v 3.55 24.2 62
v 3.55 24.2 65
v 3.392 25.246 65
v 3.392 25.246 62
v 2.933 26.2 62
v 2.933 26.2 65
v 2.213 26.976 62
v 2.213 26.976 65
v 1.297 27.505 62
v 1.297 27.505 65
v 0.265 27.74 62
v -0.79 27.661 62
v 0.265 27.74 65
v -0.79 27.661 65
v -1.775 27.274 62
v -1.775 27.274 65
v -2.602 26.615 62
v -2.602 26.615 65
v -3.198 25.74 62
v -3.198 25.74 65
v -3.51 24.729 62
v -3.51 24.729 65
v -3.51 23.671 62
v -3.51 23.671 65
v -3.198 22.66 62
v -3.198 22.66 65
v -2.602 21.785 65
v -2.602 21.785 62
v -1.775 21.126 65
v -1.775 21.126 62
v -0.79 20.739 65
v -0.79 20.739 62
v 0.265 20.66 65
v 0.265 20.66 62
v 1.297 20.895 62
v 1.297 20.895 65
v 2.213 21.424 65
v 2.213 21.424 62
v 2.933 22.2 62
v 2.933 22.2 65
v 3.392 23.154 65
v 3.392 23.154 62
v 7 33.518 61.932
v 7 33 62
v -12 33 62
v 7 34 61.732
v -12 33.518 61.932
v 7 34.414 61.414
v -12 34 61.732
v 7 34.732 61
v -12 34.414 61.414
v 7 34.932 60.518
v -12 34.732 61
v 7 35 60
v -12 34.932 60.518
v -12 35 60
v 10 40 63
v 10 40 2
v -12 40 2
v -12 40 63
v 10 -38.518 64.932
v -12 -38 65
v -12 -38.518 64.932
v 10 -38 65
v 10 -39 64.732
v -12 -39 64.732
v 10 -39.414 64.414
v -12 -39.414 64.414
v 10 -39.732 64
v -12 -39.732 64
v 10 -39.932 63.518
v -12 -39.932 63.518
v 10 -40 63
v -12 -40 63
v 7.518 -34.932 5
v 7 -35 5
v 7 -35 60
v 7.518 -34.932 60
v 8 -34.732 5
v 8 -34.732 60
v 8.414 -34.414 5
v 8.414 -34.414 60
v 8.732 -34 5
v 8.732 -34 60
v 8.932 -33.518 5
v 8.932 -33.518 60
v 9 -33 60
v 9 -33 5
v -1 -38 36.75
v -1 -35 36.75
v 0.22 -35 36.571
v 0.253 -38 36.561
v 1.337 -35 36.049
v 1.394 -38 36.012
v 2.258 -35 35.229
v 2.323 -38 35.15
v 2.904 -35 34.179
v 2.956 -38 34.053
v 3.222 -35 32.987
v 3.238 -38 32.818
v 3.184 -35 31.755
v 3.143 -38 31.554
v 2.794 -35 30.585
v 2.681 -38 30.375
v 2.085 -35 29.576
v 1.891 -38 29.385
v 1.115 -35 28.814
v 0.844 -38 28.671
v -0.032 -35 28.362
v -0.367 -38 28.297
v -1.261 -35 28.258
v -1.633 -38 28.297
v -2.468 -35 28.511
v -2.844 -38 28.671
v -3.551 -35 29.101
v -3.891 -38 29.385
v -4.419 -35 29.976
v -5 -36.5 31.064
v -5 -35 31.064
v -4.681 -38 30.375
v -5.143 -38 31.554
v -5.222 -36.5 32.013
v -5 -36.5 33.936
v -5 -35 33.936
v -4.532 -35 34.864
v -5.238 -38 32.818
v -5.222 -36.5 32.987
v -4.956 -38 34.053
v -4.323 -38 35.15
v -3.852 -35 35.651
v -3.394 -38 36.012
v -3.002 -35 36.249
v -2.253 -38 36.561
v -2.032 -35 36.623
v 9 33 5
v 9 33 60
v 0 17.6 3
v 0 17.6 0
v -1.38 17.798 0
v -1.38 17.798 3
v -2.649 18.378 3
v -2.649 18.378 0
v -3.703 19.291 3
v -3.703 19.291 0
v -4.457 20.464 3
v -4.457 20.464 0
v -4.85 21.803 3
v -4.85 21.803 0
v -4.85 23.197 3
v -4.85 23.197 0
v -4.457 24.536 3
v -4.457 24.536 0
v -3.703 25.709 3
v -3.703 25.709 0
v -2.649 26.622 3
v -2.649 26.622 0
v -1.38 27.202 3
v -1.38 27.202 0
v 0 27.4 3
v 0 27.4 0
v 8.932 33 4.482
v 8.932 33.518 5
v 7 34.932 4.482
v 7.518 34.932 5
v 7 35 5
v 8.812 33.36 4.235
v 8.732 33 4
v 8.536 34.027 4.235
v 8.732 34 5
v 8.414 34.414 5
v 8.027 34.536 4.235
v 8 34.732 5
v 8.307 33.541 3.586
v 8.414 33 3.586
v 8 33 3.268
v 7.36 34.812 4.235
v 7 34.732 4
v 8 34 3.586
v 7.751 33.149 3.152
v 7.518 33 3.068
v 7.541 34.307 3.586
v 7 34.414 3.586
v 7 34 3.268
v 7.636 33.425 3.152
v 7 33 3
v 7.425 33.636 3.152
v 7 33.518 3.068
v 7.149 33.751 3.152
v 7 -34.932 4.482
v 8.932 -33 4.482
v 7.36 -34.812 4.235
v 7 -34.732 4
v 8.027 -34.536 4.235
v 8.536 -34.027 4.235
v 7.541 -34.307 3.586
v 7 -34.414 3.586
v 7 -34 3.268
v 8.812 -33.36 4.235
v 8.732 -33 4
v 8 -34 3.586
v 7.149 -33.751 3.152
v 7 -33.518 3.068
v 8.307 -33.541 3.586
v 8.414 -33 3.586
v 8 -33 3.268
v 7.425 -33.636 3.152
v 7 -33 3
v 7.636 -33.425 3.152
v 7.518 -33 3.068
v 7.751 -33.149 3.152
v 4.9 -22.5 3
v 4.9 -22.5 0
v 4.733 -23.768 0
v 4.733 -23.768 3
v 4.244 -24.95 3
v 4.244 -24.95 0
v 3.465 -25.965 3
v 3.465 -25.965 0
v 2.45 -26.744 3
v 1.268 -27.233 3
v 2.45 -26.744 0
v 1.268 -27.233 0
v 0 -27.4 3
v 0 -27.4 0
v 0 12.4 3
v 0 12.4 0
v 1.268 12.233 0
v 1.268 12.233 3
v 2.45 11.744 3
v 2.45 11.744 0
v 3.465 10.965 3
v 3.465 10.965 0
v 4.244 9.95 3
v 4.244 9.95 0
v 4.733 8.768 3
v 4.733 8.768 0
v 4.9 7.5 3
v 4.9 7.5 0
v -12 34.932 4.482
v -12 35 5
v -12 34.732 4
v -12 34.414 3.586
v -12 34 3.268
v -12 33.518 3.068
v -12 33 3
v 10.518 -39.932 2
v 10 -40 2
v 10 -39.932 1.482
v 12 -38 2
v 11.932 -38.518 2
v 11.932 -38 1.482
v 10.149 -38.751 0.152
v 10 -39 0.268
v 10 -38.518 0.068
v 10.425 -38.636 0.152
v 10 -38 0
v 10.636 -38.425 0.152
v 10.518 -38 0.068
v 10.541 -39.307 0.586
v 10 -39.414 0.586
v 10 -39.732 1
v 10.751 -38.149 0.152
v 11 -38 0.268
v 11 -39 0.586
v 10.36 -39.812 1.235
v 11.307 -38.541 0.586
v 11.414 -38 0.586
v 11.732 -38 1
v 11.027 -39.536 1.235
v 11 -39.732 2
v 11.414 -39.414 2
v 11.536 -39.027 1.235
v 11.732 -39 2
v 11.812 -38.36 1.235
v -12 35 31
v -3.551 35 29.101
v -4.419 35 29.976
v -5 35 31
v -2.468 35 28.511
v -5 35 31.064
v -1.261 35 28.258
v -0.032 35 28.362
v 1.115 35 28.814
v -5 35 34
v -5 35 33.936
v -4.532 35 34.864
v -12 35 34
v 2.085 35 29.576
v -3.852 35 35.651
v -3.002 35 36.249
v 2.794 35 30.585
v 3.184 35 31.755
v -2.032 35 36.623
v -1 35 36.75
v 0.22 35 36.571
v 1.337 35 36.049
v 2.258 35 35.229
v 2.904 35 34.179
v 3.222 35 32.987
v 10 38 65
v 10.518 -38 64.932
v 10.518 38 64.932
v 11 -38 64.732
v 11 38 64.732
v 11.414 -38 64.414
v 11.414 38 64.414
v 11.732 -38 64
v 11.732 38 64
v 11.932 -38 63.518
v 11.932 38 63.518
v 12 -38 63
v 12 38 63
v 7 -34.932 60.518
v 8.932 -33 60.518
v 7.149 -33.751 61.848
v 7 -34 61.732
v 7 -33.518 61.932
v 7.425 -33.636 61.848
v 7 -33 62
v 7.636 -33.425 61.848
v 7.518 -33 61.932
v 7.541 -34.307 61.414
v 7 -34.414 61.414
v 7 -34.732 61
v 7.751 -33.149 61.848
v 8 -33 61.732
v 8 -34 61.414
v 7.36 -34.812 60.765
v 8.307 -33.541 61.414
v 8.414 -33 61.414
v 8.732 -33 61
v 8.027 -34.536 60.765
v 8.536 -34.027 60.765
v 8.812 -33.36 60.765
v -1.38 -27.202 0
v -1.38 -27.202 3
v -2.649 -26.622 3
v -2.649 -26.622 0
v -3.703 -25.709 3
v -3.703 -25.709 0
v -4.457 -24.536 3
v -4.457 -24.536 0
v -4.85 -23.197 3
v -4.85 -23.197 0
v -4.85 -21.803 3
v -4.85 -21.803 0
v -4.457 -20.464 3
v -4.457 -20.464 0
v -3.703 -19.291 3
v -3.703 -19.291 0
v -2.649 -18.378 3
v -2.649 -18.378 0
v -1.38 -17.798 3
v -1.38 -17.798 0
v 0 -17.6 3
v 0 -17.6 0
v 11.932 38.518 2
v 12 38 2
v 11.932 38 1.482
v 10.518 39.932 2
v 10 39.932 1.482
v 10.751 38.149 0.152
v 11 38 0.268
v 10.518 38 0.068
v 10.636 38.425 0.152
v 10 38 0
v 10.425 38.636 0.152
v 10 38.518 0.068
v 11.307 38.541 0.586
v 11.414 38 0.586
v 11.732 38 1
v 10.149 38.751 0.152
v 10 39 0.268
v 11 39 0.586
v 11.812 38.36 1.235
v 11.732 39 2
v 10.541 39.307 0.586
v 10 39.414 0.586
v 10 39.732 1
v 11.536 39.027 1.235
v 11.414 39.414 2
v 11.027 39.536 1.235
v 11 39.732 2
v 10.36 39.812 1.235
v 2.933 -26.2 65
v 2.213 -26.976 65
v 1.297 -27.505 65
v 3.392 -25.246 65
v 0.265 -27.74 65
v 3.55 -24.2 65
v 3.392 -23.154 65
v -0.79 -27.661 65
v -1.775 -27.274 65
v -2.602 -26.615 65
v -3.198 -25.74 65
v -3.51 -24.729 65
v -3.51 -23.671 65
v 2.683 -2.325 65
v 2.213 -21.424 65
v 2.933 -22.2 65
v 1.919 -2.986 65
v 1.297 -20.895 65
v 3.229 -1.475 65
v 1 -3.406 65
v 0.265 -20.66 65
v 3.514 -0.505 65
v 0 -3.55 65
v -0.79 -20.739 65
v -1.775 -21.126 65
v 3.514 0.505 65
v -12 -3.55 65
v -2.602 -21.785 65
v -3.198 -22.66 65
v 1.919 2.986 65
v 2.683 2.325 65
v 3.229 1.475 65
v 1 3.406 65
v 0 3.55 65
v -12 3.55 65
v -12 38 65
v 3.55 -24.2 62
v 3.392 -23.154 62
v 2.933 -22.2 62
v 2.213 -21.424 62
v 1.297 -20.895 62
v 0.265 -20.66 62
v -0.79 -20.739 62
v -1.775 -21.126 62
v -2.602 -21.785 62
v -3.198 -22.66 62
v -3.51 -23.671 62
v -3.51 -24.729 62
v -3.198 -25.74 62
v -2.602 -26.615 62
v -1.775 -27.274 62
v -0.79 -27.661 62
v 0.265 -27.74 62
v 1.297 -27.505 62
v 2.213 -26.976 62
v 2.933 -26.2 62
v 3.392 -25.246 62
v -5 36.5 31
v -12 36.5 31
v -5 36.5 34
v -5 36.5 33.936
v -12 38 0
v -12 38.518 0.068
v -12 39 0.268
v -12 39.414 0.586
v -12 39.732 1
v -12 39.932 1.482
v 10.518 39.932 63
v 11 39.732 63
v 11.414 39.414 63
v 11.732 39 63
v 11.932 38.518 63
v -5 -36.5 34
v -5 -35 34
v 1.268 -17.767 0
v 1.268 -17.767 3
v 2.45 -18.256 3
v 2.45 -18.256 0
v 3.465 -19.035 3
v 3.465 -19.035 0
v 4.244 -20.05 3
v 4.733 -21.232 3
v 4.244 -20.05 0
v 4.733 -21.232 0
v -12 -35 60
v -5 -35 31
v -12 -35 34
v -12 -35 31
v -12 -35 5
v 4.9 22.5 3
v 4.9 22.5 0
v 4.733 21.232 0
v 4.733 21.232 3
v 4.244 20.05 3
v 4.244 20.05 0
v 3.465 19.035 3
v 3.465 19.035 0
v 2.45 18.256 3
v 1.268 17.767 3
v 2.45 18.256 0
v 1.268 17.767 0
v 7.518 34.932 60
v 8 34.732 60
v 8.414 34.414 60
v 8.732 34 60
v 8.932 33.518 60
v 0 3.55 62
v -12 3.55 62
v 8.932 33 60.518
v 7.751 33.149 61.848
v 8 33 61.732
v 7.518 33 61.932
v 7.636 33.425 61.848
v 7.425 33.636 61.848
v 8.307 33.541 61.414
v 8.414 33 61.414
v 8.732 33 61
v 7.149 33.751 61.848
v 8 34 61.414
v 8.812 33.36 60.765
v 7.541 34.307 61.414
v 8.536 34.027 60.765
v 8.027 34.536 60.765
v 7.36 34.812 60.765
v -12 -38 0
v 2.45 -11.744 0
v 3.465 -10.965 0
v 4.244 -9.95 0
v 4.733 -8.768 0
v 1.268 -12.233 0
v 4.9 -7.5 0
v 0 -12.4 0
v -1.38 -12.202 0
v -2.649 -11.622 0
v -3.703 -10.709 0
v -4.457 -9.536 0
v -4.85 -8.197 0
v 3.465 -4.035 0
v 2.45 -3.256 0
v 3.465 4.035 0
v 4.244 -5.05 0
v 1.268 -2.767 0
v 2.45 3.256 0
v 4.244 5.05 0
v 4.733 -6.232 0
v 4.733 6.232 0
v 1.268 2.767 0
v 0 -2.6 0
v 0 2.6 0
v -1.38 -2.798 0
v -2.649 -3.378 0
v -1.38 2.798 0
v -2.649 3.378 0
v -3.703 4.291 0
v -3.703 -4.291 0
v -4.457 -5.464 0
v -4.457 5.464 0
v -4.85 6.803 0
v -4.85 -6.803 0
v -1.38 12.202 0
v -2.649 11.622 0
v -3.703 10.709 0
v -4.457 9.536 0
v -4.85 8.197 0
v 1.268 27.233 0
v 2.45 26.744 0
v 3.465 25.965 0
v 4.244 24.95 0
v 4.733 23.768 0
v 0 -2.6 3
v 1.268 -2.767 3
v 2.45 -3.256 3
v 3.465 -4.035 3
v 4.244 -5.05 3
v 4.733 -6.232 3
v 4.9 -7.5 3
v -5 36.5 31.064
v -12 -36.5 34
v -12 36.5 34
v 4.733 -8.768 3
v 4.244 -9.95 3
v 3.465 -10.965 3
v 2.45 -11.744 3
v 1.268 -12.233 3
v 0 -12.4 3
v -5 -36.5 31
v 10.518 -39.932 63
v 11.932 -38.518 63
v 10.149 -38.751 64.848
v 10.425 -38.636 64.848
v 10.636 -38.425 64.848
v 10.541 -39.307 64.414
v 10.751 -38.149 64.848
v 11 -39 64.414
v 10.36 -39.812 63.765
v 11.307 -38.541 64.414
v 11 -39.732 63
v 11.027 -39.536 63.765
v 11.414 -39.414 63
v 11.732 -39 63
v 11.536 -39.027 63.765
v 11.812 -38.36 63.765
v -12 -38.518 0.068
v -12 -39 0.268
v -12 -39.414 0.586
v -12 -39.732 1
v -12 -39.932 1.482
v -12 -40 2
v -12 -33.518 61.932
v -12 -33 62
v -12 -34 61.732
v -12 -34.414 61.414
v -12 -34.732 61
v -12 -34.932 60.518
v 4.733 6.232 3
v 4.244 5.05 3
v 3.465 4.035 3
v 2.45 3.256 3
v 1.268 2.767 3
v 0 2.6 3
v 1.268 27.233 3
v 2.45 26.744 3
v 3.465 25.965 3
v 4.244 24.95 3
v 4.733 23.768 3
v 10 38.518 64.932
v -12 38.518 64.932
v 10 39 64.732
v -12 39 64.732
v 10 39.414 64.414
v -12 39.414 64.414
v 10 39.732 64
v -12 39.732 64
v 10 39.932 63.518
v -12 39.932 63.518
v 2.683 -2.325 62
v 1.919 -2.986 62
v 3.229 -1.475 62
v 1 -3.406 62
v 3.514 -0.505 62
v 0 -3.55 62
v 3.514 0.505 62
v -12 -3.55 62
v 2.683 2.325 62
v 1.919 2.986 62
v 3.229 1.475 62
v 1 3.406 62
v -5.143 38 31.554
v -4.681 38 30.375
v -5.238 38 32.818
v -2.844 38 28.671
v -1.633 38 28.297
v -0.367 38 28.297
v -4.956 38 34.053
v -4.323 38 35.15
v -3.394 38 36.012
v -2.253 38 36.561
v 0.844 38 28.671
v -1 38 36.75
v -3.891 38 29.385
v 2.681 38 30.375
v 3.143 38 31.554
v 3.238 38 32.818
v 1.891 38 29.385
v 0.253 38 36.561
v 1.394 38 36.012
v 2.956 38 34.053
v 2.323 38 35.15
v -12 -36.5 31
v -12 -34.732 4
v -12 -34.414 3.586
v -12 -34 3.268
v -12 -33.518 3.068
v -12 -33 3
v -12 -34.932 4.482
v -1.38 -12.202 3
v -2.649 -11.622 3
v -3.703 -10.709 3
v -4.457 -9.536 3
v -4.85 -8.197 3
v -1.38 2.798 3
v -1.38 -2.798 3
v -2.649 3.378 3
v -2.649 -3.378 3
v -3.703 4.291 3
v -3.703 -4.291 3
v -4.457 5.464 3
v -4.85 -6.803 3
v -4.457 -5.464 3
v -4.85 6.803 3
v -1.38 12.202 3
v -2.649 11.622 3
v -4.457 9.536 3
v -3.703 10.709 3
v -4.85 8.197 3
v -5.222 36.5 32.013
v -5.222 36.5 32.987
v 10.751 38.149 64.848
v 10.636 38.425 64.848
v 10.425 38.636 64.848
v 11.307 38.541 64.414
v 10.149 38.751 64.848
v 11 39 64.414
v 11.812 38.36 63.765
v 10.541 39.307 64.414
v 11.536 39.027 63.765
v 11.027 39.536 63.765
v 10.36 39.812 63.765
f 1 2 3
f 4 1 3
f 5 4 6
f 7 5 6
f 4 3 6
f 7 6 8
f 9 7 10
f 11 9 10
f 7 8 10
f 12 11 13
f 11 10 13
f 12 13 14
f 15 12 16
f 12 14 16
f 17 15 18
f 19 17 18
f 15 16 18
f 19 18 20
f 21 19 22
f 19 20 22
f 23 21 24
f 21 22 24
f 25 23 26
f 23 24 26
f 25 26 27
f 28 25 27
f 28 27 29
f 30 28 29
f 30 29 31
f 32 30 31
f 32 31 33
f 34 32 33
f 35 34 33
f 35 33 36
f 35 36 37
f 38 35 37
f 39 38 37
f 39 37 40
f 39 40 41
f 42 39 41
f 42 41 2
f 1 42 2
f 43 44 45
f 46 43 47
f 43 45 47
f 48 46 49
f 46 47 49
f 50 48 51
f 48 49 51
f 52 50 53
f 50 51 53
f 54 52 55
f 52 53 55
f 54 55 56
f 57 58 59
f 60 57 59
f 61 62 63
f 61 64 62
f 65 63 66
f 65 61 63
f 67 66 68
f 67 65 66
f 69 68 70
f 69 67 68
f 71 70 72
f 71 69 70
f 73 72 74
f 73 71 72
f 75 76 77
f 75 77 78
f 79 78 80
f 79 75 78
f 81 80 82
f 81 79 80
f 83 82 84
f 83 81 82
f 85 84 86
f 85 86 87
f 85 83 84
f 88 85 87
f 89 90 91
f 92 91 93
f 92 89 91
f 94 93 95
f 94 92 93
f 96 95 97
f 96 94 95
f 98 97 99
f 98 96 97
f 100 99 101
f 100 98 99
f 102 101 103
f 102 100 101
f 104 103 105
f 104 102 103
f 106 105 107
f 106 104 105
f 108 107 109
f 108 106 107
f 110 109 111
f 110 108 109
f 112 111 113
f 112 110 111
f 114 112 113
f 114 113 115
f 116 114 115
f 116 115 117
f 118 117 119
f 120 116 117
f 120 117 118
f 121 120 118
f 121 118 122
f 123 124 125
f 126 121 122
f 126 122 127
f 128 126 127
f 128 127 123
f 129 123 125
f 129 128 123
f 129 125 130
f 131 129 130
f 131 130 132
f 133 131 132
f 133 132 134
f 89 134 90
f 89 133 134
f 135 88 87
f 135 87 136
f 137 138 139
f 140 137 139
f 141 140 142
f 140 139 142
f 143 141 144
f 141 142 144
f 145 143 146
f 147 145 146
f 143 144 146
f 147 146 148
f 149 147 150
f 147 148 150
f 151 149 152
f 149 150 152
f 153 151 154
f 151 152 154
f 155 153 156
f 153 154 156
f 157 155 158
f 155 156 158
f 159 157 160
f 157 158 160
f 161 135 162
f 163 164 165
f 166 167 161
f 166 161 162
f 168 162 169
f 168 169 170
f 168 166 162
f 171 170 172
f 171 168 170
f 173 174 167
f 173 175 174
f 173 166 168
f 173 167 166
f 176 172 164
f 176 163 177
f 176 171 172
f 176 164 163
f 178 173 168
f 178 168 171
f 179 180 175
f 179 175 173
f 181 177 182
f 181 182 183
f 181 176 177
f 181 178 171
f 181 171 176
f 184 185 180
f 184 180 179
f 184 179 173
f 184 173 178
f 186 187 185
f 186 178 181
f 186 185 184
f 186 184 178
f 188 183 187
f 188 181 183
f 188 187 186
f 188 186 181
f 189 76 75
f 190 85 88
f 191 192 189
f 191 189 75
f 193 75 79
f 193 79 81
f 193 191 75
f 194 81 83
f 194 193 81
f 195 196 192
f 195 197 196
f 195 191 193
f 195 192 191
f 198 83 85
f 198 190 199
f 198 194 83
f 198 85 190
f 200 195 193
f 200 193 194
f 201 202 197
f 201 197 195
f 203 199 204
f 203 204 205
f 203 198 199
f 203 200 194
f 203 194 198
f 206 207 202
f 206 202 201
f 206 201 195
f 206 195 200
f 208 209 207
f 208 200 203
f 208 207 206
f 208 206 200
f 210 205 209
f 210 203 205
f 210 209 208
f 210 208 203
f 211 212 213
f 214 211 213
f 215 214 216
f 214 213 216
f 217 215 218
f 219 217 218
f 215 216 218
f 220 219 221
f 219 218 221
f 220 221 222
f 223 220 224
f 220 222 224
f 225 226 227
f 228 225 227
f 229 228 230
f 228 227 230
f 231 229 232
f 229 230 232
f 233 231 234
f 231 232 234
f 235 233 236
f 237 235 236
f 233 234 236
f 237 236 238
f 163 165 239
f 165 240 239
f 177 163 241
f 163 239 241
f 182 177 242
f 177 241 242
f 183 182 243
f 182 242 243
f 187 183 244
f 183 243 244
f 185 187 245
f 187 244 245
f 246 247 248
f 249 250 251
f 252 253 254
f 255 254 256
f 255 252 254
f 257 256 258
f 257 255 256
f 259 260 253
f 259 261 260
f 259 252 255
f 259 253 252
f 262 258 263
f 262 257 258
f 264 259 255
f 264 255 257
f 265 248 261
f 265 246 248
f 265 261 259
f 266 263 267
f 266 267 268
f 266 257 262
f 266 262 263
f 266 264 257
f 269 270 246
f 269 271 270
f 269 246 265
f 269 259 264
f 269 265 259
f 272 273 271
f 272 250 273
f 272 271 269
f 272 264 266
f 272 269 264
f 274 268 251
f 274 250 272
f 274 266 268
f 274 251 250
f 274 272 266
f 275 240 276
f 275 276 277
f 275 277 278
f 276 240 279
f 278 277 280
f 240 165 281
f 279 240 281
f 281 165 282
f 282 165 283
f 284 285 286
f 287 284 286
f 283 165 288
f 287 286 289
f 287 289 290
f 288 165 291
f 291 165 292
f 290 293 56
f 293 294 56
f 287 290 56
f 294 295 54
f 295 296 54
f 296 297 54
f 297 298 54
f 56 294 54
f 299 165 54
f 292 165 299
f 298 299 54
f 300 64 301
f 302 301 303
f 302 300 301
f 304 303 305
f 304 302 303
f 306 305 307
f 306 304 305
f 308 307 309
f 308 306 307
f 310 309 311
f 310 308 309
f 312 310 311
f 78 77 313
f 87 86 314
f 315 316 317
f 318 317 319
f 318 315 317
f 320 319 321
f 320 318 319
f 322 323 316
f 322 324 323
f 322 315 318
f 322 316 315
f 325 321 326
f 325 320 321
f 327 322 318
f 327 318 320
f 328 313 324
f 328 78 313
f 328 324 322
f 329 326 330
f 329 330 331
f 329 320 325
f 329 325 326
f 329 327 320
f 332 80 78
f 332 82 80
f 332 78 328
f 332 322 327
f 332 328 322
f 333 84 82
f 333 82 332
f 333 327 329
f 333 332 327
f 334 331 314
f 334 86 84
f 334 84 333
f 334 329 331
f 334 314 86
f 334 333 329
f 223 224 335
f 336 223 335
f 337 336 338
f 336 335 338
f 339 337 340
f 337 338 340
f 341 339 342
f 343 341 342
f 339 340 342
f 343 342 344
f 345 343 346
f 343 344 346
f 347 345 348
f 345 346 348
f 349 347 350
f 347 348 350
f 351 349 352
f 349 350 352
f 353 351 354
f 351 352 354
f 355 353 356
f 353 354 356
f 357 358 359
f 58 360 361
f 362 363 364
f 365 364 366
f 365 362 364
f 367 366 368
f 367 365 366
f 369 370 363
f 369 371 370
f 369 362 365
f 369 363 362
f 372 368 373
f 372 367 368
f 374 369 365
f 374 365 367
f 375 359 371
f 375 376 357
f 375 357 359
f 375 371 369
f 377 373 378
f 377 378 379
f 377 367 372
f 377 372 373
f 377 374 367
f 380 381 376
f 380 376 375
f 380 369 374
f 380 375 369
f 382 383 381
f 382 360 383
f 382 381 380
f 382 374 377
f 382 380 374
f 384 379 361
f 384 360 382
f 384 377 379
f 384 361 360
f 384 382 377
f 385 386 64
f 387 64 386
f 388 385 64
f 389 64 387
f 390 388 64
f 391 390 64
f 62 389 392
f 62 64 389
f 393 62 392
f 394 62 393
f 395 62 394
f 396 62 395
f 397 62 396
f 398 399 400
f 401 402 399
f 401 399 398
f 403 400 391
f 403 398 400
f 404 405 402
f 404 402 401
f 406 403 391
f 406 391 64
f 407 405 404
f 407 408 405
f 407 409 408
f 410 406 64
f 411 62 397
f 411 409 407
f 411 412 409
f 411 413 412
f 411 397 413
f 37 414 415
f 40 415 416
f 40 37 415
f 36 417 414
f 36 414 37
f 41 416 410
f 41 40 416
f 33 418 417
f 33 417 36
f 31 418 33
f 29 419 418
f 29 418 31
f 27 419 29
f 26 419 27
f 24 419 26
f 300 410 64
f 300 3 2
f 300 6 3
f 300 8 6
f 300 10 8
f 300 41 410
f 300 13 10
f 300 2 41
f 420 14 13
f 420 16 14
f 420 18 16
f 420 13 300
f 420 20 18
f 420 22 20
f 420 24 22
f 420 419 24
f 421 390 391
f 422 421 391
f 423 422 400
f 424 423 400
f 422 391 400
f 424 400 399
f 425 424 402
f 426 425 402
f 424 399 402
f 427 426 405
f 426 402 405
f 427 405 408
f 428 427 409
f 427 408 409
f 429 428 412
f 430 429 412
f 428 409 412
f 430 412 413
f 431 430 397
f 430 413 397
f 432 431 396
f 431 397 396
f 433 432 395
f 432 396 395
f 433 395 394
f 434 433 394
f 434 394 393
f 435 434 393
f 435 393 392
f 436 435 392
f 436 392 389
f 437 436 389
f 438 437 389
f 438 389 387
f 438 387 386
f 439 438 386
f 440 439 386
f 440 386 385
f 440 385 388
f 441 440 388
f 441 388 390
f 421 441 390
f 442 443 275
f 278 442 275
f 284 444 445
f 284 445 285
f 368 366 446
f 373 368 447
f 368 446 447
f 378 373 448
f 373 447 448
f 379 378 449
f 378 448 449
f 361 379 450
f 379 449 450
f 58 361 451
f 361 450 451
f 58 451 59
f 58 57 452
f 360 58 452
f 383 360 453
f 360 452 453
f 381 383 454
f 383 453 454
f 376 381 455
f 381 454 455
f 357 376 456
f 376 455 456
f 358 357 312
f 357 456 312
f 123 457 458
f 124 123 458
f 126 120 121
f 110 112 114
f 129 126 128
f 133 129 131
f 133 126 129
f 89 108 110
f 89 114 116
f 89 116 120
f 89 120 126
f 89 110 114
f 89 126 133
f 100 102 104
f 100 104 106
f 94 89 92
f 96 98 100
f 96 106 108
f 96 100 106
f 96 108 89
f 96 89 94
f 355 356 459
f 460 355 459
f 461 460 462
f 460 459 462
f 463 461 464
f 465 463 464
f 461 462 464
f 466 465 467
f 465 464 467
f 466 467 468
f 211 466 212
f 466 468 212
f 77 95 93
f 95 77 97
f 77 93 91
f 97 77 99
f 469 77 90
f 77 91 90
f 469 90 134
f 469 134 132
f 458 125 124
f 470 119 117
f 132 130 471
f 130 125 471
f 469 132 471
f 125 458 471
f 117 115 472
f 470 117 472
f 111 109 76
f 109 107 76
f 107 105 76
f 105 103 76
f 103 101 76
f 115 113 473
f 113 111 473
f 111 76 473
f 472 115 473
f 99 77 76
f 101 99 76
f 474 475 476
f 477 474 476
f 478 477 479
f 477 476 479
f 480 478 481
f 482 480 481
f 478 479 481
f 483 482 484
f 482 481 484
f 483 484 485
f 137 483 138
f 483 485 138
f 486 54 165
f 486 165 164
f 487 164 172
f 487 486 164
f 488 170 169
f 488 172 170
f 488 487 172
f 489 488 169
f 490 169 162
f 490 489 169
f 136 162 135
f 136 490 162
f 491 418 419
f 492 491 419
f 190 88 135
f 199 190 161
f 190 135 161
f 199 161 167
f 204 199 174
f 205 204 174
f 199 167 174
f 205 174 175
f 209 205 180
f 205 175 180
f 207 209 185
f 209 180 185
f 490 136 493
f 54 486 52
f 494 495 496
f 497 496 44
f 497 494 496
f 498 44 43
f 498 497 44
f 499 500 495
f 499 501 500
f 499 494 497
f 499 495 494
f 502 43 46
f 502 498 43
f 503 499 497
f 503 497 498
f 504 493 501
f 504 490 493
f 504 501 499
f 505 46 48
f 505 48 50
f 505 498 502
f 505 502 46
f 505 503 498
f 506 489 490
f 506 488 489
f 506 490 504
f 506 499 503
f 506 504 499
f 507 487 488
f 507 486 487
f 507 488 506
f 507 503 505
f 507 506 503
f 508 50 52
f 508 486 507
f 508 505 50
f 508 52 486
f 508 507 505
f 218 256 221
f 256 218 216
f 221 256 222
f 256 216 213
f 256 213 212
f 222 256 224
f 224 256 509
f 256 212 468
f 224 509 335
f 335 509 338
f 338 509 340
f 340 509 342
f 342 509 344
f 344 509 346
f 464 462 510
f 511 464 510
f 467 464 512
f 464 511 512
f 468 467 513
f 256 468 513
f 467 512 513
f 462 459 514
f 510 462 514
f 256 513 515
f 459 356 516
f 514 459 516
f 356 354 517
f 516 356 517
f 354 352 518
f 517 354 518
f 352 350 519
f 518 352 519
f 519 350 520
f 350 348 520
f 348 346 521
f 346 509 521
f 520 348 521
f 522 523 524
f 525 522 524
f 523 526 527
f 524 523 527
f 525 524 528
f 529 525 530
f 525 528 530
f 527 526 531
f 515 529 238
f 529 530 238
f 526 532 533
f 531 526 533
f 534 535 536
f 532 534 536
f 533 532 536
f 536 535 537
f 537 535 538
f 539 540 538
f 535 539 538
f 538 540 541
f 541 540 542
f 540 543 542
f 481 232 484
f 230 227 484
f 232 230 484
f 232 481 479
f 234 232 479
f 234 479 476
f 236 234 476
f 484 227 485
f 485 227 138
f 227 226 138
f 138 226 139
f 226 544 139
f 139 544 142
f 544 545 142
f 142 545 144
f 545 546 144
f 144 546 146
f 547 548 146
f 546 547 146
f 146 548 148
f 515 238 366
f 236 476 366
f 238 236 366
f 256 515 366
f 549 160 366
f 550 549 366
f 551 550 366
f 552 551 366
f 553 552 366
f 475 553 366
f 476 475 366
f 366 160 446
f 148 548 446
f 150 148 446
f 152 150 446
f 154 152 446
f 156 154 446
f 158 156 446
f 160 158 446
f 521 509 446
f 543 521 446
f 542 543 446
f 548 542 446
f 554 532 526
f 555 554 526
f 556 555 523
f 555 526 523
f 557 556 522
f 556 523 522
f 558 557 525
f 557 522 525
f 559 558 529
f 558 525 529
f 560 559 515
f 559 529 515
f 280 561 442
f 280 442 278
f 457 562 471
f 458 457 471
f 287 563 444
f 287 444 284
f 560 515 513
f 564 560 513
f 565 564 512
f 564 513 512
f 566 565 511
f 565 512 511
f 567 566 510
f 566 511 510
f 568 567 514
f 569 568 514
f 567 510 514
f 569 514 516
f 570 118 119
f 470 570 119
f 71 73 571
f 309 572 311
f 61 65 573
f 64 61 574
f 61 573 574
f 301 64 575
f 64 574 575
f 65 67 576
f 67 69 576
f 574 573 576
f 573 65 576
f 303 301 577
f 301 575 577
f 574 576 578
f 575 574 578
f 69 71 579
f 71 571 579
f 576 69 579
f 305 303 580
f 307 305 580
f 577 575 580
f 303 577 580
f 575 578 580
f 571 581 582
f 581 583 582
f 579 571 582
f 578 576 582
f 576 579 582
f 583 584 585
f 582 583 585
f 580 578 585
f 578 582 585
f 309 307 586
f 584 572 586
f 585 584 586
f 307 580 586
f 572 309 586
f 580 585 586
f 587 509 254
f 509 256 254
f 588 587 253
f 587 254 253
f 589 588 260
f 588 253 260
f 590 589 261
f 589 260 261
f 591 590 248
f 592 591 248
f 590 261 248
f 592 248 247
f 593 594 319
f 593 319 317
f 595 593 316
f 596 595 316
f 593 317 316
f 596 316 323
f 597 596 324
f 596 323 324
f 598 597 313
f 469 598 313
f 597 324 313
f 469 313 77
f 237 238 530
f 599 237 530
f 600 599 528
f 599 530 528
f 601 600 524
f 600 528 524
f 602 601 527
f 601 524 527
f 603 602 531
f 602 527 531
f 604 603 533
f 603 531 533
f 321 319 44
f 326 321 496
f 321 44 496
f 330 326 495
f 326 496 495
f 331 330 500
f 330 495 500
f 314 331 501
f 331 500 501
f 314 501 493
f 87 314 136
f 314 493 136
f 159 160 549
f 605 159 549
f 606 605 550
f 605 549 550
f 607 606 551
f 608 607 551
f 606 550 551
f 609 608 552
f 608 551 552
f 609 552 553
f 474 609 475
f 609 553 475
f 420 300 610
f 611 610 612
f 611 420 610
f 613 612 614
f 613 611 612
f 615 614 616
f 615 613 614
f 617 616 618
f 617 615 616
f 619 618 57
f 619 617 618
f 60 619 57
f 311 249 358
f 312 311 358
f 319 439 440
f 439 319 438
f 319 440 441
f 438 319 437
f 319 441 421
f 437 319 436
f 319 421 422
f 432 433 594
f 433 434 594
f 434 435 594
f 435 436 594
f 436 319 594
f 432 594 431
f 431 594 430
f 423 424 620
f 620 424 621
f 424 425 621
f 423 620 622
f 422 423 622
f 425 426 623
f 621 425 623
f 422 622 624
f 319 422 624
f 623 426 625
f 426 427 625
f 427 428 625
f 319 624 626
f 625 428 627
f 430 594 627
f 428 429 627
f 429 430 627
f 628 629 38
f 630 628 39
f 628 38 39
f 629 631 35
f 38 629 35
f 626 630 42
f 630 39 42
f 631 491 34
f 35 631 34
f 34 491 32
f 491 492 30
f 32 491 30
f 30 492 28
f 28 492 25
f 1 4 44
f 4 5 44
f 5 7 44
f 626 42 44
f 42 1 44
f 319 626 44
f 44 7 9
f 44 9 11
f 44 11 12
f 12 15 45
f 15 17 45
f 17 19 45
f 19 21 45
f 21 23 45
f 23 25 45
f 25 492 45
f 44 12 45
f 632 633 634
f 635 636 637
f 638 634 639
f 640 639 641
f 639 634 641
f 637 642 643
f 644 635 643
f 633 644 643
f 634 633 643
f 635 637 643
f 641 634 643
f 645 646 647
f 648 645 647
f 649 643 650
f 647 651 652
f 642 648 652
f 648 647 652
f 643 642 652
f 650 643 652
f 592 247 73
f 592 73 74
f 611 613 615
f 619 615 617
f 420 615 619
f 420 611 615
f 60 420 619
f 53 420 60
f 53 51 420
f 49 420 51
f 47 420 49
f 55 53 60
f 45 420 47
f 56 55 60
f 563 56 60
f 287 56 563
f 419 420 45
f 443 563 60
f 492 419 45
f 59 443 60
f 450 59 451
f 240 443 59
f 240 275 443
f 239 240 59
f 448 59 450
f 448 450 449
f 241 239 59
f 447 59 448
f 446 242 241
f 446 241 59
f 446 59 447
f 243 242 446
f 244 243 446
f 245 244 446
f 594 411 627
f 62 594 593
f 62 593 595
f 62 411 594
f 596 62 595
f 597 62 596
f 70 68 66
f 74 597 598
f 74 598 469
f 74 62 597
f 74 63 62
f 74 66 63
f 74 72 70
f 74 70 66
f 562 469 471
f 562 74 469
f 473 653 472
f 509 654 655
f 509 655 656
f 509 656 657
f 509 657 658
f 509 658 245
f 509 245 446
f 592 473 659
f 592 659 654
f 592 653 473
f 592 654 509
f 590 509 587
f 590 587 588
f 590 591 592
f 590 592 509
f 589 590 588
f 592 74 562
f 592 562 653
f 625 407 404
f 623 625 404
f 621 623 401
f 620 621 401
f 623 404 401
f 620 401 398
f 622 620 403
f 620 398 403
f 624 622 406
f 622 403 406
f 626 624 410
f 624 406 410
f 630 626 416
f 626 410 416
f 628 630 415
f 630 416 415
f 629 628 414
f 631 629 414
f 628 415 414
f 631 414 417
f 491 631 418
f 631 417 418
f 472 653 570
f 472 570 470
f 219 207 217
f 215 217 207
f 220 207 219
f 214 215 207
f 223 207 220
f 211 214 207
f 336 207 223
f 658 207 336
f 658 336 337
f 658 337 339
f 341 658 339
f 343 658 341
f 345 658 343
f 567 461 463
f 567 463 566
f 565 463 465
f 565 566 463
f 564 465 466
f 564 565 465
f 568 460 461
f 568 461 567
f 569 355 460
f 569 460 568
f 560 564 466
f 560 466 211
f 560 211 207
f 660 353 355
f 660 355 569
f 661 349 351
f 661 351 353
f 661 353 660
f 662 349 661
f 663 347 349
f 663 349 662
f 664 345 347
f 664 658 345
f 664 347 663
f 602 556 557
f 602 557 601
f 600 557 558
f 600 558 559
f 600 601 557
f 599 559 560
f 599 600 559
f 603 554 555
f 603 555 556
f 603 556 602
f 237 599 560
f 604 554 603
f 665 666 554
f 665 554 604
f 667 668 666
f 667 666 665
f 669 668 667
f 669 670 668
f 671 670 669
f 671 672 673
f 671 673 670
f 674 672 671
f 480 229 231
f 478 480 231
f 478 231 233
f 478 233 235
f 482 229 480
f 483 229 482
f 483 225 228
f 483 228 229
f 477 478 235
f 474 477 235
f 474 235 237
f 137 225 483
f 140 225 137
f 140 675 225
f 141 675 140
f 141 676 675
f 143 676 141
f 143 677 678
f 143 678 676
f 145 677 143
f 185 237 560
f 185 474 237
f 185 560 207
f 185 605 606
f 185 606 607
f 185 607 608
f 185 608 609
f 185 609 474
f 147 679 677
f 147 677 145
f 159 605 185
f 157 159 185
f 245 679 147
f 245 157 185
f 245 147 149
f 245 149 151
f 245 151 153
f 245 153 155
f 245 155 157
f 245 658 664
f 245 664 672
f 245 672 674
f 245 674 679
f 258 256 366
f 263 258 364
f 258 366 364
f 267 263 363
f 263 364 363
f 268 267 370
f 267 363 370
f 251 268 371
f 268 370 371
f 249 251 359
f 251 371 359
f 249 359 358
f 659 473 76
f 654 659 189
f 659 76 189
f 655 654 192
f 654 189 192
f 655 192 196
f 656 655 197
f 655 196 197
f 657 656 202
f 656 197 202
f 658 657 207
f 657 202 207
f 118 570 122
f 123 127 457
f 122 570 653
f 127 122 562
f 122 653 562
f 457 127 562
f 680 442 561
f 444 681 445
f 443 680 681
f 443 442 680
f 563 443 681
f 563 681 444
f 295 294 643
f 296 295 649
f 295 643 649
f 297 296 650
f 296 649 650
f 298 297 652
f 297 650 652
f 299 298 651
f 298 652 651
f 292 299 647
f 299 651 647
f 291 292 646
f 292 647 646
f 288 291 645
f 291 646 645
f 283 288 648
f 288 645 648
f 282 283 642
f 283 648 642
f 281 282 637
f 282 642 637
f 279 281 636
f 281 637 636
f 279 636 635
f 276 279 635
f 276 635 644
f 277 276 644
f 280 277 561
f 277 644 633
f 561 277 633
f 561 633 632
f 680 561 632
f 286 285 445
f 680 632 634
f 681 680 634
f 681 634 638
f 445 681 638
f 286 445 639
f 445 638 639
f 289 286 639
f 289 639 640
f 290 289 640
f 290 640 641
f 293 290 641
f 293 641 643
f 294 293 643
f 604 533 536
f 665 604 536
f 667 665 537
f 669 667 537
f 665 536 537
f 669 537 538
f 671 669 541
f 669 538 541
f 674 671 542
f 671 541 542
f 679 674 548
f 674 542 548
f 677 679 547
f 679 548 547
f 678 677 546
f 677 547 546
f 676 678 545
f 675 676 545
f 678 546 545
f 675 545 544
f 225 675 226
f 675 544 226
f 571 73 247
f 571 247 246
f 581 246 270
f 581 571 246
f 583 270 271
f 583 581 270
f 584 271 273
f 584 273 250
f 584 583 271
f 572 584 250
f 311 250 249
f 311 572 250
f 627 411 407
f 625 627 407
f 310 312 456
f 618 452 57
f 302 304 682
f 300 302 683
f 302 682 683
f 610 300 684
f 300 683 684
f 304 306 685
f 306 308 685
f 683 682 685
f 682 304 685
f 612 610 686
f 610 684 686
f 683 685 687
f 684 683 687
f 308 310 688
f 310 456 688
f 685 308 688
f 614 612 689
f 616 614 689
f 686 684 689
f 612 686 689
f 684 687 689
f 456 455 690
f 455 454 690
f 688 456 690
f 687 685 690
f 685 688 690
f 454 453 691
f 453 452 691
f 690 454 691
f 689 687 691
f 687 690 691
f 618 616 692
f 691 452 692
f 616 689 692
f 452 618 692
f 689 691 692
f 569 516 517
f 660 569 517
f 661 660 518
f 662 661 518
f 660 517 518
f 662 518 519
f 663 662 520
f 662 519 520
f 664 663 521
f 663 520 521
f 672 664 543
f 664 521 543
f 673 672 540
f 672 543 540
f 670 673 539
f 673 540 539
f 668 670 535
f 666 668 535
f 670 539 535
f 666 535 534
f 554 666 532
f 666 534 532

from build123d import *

# Parameters (mm, degrees)
SKETCH1_W                                   = 80
SKETCH1_H                                   = 24
BOSS_EXTRUDE1_DEPTH                         = 65
F_2_MM_TOP_BOT_3_MM_SIDE_T                  = -3
F_2_MM_TOP_BOT_3_MM_SIDE_THICKNESS_2_FACE_W = 59
F_2_MM_TOP_BOT_3_MM_SIDE_THICKNESS_2_FACE_H = 21
F_2_MM_TOP_BOT_3_MM_SIDE_THICKNESS_2_DEPTH  = 2
F_2_MM_TOP_BOT_3_MM_SIDE_THICKNESS_3_FACE_W = 21
F_2_MM_TOP_BOT_3_MM_SIDE_THICKNESS_3_FACE_H = 59
F_2_MM_TOP_BOT_3_MM_SIDE_THICKNESS_3_DEPTH  = 2
F_9_8_MM_PORT_HOLES_DEPTH                   = 3
SKETCH4_R                                   = 3.55
F_7_1_MM_FIXTURE_HOLES_DEPTH                = 10
F_2_MM_RADIUS_R                             = 2
F_8_5_START                                 = -2
SKETCH7_R                                   = 4.25
F_8_5_MM_HOLD_OFFSET_2_MM_DEPTH             = 3.2
R2_FILET_R                                  = 2
SKETCH8_W                                   = 3
SKETCH8_H                                   = 3
F_7_MM_NOTCH_DEPTH                          = 7


with BuildPart() as part:
    # Sketch1 → Boss-Extrude1 (new body)
    with BuildSketch(Plane(origin=(0, 0, 0), x_dir=(0, 1, 0), z_dir=(0, 0, 1))):
        Rectangle(SKETCH1_W, SKETCH1_H)
    extrude(amount=BOSS_EXTRUDE1_DEPTH)

    # 2 mm top/bot 3 mm side
    f_2_mm_top_bot_3_mm_side_openings = [part.faces().sort_by_distance(p)[0] for p in [
        (-12, 0, 32.5),
    ]]
    offset(amount=F_2_MM_TOP_BOT_3_MM_SIDE_T, openings=f_2_mm_top_bot_3_mm_side_openings, kind=Kind.INTERSECTION)

    # 2 mm top/bot 3 mm side thickness 2 face (on inner face of the shell) → 2 mm top/bot 3 mm side thickness 2 (add)
    with BuildSketch(Plane(origin=(-1.5, 37, 32.5), x_dir=(0, 0, 1), z_dir=(0, 1, 0))):
        Rectangle(F_2_MM_TOP_BOT_3_MM_SIDE_THICKNESS_2_FACE_W, F_2_MM_TOP_BOT_3_MM_SIDE_THICKNESS_2_FACE_H)
    extrude(amount=-F_2_MM_TOP_BOT_3_MM_SIDE_THICKNESS_2_DEPTH)

    # 2 mm top/bot 3 mm side thickness 3 face (on inner face of the shell) → 2 mm top/bot 3 mm side thickness 3 (add)
    with BuildSketch(Plane(origin=(-1.5, -37, 32.5), x_dir=(-1, 0, 0), z_dir=(0, -1, 0))):
        Rectangle(F_2_MM_TOP_BOT_3_MM_SIDE_THICKNESS_3_FACE_W, F_2_MM_TOP_BOT_3_MM_SIDE_THICKNESS_3_FACE_H)
    extrude(amount=-F_2_MM_TOP_BOT_3_MM_SIDE_THICKNESS_3_DEPTH)

    # Sketch3 → 9.8 mm port holes (cut)
    with BuildSketch(Plane(origin=(0, 0, 0), x_dir=(1, 0, 0), z_dir=(0, 0, -1))):
        with BuildLine():
            ThreePointArc((4.9, 22.5), (3.464823228, 25.964823228), (0, 27.4))
            Line((0, 27.4), (0, 17.6))
            ThreePointArc((0, 17.6), (3.464823228, 19.035176772), (4.9, 22.5))
        make_face()
        with BuildLine():
            Line((0, 17.6), (0, 27.4))
            ThreePointArc((0, 27.4), (-4.9, 22.5), (0, 17.6))
        make_face()
        with BuildLine():
            ThreePointArc((4.9, 7.5), (3.464823228, 10.964823228), (0, 12.4))
            Line((0, 12.4), (0, 2.6))
            ThreePointArc((0, 2.6), (3.464823228, 4.035176772), (4.9, 7.5))
        make_face()
        with BuildLine():
            Line((0, 2.6), (0, 12.4))
            ThreePointArc((0, 12.4), (-4.9, 7.5), (0, 2.6))
        make_face()
        with BuildLine():
            ThreePointArc((4.9, -7.5), (3.464823228, -4.035176772), (0, -2.6))
            Line((0, -2.6), (0, -12.4))
            ThreePointArc((0, -12.4), (3.464823228, -10.964823228), (4.9, -7.5))
        make_face()
        with BuildLine():
            Line((0, -12.4), (0, -2.6))
            ThreePointArc((0, -2.6), (-4.9, -7.5), (0, -12.4))
        make_face()
        with BuildLine():
            ThreePointArc((4.9, -22.5), (3.464823228, -19.035176772), (0, -17.6))
            Line((0, -17.6), (0, -27.4))
            ThreePointArc((0, -27.4), (3.464823228, -25.964823228), (4.9, -22.5))
        make_face()
        with BuildLine():
            Line((0, -27.4), (0, -17.6))
            ThreePointArc((0, -17.6), (-4.9, -22.5), (0, -27.4))
        make_face()
    extrude(amount=-F_9_8_MM_PORT_HOLES_DEPTH, mode=Mode.SUBTRACT)

    # Sketch4 → 7.1 mm fixture holes (cut)
    with BuildSketch(Plane.XY.offset(65)):
        with Locations((0, 24.2)):
            Circle(SKETCH4_R)
        Circle(SKETCH4_R)
        with Locations((0, -24.2)):
            Circle(SKETCH4_R)
        with BuildLine():
            ThreePointArc((0, -3.55), (-3.55, 0), (0, 3.55))
            Line((0, 3.55), (-12, 3.55))
            Line((-12, 3.55), (-12, -3.55))
            Line((-12, -3.55), (0, -3.55))
        make_face()
    extrude(amount=-F_7_1_MM_FIXTURE_HOLES_DEPTH, mode=Mode.SUBTRACT)

    # 2 mm radius
    f_2_mm_radius_edges = [part.edges().sort_by_distance(p)[0] for p in [
        (9, -35, 32.5),
        (9, 35, 32.5),
        (12, -40, 32.5),
        (12, 40, 32.5),
    ]]
    fillet(f_2_mm_radius_edges, radius=F_2_MM_RADIUS_R)

    # Sketch7 → 8.5 mm hold offset 2 mm (cut)
    with BuildSketch(Plane(origin=(0, 40, 0), x_dir=(-1, 0, 0), z_dir=(0, 1, 0)).offset(F_8_5_START)):
        with Locations(Location((1, 32.5, 0), (0, 0, 90))):
            Circle(SKETCH7_R)
    f_8_5_mm_hold_offset_2_mm = extrude(amount=-F_8_5_MM_HOLD_OFFSET_2_MM_DEPTH, mode=Mode.SUBTRACT)

    # magnet slot mirror: 8.5 mm hold offset 2 mm across plane
    add(f_8_5_mm_hold_offset_2_mm.mirror(Plane.ZX), mode=Mode.SUBTRACT)

    # R2 filet
    r2_filet_edges = [part.edges().sort_by_distance(p)[0] for p in [
        (9, 0, 3),
        (9, 0, 62),
        (-2.5, 35, 3),
        (-2.5, -35, 3),
        (8.414213562, -34.414213562, 3),
        (8.414213562, 34.414213562, 3),
        (-2.5, 35, 62),
        (-2.5, -35, 62),
        (8.414213562, -34.414213562, 62),
        (8.414213562, 34.414213562, 62),
        (12, 0, 0),
        (12, 0, 65),
        (-1, -40, 0),
        (-1, 40, 0),
        (11.414213562, 39.414213562, 0),
        (11.414213562, -39.414213562, 0),
        (-1, -40, 65),
        (-1, 40, 65),
        (11.414213562, 39.414213562, 65),
        (11.414213562, -39.414213562, 65),
    ]]
    fillet(r2_filet_edges, radius=R2_FILET_R)

    # Sketch8 → 7 mm notch (cut)
    with BuildSketch(Plane(origin=(-12, 0, 0), x_dir=(0, -1, 0), z_dir=(-1, 0, 0))):
        with Locations((-35, 32.5)):
            Rectangle(SKETCH8_W, SKETCH8_H)
    f_7_mm_notch = extrude(amount=-F_7_MM_NOTCH_DEPTH, mode=Mode.SUBTRACT)

    # 7 mm notch mirror: 7 mm notch across plane
    add(f_7_mm_notch.mirror(Plane.ZX), mode=Mode.SUBTRACT)


solid = part.part
